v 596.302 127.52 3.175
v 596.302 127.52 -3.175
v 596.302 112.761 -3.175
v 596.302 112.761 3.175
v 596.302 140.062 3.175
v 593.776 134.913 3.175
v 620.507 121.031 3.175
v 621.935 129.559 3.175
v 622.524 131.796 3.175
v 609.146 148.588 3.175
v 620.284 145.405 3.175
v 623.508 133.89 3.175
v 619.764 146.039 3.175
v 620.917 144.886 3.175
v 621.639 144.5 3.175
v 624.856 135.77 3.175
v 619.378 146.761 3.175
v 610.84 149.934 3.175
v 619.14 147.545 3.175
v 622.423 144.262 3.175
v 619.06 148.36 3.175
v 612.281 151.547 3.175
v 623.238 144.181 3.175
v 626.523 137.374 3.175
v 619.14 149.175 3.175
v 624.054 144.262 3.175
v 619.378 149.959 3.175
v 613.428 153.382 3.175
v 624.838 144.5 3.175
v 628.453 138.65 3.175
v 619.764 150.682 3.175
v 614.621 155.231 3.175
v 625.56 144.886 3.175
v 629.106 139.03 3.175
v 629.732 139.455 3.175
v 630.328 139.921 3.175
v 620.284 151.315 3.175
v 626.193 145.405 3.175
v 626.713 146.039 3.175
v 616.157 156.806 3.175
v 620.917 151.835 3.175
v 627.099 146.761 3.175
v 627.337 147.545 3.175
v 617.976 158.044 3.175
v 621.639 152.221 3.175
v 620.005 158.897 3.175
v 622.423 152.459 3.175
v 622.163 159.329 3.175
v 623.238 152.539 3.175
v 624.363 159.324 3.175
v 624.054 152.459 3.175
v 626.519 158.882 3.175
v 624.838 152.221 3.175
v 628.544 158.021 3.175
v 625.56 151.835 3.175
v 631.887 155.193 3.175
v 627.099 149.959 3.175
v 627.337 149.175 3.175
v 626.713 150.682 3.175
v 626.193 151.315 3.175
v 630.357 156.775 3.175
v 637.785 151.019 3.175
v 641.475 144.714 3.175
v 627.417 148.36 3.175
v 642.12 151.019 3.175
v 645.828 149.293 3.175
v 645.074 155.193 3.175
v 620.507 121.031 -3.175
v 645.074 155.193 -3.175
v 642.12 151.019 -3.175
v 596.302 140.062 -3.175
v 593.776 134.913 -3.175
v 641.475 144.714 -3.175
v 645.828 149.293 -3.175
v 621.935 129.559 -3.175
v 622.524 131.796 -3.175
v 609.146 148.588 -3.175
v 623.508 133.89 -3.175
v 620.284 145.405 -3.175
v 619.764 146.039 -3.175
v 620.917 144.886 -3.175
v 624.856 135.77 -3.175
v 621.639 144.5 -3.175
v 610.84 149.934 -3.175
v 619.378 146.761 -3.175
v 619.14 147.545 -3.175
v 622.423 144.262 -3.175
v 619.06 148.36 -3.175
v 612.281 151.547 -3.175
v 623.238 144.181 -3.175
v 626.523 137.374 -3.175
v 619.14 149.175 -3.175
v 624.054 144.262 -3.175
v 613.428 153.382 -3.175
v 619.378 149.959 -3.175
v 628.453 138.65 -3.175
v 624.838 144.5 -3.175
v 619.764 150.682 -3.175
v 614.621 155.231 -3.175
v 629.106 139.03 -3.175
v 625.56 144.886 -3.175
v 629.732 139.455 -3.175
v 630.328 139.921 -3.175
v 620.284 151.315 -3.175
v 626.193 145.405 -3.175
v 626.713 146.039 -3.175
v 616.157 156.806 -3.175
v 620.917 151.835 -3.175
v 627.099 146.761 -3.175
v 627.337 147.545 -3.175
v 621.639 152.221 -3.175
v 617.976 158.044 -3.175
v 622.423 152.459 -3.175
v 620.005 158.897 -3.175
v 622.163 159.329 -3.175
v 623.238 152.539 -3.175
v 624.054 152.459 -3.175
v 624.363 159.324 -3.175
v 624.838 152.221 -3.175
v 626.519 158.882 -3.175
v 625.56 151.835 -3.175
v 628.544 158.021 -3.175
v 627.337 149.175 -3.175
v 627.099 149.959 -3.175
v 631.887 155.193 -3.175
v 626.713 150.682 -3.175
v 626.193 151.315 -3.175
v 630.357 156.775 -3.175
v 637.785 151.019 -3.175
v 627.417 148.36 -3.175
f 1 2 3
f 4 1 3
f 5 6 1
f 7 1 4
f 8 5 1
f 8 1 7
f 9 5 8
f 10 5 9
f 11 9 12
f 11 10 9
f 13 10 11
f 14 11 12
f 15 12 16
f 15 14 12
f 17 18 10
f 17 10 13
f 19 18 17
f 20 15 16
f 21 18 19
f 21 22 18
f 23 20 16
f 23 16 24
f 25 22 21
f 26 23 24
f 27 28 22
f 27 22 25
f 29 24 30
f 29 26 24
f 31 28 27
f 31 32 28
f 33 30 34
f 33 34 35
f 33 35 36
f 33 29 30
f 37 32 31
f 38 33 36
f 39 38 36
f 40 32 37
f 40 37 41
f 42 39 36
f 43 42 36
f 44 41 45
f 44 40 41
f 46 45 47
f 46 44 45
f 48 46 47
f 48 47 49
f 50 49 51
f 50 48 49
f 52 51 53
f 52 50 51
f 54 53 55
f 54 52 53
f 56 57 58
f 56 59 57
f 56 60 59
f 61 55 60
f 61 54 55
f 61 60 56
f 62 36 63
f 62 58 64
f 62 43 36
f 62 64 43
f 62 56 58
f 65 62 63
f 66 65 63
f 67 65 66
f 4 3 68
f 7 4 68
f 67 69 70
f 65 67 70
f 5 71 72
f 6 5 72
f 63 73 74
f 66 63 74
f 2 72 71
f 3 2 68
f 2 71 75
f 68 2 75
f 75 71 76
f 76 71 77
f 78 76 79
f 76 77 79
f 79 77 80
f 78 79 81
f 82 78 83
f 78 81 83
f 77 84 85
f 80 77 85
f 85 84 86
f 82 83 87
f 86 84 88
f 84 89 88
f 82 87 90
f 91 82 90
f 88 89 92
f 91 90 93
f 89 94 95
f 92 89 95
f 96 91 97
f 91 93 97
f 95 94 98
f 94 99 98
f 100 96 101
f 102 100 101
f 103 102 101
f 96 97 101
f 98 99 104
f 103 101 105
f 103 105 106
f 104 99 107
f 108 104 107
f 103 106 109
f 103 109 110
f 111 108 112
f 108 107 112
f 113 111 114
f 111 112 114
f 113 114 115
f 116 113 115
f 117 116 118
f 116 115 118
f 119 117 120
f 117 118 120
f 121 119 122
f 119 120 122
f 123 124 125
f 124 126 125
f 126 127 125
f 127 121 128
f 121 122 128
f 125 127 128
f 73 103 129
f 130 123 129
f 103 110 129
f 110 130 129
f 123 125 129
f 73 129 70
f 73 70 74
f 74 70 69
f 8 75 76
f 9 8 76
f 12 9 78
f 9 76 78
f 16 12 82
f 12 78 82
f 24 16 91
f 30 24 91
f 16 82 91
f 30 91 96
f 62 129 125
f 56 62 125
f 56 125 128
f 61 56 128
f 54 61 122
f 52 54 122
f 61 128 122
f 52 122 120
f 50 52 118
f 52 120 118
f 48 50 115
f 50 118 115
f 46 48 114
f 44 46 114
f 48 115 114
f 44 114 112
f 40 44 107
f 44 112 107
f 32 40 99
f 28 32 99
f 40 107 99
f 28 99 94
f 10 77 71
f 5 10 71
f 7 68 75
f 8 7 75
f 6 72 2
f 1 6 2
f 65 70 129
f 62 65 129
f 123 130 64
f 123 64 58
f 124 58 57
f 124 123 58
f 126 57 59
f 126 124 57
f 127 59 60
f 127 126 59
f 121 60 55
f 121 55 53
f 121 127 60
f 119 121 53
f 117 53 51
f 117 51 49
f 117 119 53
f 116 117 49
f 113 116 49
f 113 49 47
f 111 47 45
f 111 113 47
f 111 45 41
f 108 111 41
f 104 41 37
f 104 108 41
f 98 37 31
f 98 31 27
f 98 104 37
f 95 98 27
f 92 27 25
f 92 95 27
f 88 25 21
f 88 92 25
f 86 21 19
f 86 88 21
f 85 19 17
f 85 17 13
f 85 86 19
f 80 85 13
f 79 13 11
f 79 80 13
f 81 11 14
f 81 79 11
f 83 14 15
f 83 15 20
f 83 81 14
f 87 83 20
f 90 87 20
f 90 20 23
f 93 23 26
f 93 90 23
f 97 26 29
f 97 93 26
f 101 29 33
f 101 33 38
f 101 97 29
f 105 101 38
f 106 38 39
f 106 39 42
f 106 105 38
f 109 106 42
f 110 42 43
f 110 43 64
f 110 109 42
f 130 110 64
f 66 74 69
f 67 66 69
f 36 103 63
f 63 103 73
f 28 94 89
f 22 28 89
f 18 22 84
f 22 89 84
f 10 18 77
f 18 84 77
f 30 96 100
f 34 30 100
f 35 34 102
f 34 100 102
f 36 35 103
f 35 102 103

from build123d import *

# Parameters (mm, degrees)
BOSS_EXTRUDE1_DEPTH      = 3.175
BOSS_EXTRUDE1_DEPTH_BACK = 3.175
SKETCH1_R                = 4.178670833


with BuildPart() as part:
    # Sketch1 → Boss-Extrude1 (new, two sides: drawn at the far end of the back side and taken through both)
    with BuildSketch(Plane.XY.offset(-BOSS_EXTRUDE1_DEPTH_BACK)):
        with BuildLine():
            Line((596.301932932, 140.061825094), (593.775672351, 134.913286528))
            Line((593.775672351, 134.913286528), (596.301932932, 127.519508045))
            Line((596.301932932, 127.519508045), (596.301932932, 112.761180415))
            Line((596.301932932, 112.761180415), (620.507043959, 121.0314333))
            Line((620.507043959, 121.0314333), (621.935426787, 129.559046913))
            ThreePointArc((621.935426787, 129.559046913), (624.139317927, 134.860628873), (628.452705625, 138.649902417))
            ThreePointArc((628.452705625, 138.649902417), (629.422874429, 139.237084375), (630.327572389, 139.920847318))
            Line((630.327572389, 139.920847318), (641.475190915, 144.713939185))
            Line((641.475190915, 144.713939185), (645.828084101, 149.293372969))
            Line((645.828084101, 149.293372969), (645.073577651, 155.192660049))
            Line((645.073577651, 155.192660049), (642.120102738, 151.018989056))
            Line((642.120102738, 151.018989056), (637.784779863, 151.018989056))
            Line((637.784779863, 151.018989056), (631.886802035, 155.192660049))
            ThreePointArc((631.886802035, 155.192660049), (622.162679723, 159.329151932), (613.427511309, 153.382223935))
            ThreePointArc((613.427511309, 153.382223935), (611.595219928, 150.709853801), (609.146322902, 148.588119322))
            Line((609.146322902, 148.588119322), (596.301932932, 140.061825094))
        make_face()
        with Locations((623.238490422, 148.360136067)):
            Circle(SKETCH1_R, mode=Mode.SUBTRACT)
    extrude(amount=BOSS_EXTRUDE1_DEPTH + BOSS_EXTRUDE1_DEPTH_BACK)


solid = part.part
